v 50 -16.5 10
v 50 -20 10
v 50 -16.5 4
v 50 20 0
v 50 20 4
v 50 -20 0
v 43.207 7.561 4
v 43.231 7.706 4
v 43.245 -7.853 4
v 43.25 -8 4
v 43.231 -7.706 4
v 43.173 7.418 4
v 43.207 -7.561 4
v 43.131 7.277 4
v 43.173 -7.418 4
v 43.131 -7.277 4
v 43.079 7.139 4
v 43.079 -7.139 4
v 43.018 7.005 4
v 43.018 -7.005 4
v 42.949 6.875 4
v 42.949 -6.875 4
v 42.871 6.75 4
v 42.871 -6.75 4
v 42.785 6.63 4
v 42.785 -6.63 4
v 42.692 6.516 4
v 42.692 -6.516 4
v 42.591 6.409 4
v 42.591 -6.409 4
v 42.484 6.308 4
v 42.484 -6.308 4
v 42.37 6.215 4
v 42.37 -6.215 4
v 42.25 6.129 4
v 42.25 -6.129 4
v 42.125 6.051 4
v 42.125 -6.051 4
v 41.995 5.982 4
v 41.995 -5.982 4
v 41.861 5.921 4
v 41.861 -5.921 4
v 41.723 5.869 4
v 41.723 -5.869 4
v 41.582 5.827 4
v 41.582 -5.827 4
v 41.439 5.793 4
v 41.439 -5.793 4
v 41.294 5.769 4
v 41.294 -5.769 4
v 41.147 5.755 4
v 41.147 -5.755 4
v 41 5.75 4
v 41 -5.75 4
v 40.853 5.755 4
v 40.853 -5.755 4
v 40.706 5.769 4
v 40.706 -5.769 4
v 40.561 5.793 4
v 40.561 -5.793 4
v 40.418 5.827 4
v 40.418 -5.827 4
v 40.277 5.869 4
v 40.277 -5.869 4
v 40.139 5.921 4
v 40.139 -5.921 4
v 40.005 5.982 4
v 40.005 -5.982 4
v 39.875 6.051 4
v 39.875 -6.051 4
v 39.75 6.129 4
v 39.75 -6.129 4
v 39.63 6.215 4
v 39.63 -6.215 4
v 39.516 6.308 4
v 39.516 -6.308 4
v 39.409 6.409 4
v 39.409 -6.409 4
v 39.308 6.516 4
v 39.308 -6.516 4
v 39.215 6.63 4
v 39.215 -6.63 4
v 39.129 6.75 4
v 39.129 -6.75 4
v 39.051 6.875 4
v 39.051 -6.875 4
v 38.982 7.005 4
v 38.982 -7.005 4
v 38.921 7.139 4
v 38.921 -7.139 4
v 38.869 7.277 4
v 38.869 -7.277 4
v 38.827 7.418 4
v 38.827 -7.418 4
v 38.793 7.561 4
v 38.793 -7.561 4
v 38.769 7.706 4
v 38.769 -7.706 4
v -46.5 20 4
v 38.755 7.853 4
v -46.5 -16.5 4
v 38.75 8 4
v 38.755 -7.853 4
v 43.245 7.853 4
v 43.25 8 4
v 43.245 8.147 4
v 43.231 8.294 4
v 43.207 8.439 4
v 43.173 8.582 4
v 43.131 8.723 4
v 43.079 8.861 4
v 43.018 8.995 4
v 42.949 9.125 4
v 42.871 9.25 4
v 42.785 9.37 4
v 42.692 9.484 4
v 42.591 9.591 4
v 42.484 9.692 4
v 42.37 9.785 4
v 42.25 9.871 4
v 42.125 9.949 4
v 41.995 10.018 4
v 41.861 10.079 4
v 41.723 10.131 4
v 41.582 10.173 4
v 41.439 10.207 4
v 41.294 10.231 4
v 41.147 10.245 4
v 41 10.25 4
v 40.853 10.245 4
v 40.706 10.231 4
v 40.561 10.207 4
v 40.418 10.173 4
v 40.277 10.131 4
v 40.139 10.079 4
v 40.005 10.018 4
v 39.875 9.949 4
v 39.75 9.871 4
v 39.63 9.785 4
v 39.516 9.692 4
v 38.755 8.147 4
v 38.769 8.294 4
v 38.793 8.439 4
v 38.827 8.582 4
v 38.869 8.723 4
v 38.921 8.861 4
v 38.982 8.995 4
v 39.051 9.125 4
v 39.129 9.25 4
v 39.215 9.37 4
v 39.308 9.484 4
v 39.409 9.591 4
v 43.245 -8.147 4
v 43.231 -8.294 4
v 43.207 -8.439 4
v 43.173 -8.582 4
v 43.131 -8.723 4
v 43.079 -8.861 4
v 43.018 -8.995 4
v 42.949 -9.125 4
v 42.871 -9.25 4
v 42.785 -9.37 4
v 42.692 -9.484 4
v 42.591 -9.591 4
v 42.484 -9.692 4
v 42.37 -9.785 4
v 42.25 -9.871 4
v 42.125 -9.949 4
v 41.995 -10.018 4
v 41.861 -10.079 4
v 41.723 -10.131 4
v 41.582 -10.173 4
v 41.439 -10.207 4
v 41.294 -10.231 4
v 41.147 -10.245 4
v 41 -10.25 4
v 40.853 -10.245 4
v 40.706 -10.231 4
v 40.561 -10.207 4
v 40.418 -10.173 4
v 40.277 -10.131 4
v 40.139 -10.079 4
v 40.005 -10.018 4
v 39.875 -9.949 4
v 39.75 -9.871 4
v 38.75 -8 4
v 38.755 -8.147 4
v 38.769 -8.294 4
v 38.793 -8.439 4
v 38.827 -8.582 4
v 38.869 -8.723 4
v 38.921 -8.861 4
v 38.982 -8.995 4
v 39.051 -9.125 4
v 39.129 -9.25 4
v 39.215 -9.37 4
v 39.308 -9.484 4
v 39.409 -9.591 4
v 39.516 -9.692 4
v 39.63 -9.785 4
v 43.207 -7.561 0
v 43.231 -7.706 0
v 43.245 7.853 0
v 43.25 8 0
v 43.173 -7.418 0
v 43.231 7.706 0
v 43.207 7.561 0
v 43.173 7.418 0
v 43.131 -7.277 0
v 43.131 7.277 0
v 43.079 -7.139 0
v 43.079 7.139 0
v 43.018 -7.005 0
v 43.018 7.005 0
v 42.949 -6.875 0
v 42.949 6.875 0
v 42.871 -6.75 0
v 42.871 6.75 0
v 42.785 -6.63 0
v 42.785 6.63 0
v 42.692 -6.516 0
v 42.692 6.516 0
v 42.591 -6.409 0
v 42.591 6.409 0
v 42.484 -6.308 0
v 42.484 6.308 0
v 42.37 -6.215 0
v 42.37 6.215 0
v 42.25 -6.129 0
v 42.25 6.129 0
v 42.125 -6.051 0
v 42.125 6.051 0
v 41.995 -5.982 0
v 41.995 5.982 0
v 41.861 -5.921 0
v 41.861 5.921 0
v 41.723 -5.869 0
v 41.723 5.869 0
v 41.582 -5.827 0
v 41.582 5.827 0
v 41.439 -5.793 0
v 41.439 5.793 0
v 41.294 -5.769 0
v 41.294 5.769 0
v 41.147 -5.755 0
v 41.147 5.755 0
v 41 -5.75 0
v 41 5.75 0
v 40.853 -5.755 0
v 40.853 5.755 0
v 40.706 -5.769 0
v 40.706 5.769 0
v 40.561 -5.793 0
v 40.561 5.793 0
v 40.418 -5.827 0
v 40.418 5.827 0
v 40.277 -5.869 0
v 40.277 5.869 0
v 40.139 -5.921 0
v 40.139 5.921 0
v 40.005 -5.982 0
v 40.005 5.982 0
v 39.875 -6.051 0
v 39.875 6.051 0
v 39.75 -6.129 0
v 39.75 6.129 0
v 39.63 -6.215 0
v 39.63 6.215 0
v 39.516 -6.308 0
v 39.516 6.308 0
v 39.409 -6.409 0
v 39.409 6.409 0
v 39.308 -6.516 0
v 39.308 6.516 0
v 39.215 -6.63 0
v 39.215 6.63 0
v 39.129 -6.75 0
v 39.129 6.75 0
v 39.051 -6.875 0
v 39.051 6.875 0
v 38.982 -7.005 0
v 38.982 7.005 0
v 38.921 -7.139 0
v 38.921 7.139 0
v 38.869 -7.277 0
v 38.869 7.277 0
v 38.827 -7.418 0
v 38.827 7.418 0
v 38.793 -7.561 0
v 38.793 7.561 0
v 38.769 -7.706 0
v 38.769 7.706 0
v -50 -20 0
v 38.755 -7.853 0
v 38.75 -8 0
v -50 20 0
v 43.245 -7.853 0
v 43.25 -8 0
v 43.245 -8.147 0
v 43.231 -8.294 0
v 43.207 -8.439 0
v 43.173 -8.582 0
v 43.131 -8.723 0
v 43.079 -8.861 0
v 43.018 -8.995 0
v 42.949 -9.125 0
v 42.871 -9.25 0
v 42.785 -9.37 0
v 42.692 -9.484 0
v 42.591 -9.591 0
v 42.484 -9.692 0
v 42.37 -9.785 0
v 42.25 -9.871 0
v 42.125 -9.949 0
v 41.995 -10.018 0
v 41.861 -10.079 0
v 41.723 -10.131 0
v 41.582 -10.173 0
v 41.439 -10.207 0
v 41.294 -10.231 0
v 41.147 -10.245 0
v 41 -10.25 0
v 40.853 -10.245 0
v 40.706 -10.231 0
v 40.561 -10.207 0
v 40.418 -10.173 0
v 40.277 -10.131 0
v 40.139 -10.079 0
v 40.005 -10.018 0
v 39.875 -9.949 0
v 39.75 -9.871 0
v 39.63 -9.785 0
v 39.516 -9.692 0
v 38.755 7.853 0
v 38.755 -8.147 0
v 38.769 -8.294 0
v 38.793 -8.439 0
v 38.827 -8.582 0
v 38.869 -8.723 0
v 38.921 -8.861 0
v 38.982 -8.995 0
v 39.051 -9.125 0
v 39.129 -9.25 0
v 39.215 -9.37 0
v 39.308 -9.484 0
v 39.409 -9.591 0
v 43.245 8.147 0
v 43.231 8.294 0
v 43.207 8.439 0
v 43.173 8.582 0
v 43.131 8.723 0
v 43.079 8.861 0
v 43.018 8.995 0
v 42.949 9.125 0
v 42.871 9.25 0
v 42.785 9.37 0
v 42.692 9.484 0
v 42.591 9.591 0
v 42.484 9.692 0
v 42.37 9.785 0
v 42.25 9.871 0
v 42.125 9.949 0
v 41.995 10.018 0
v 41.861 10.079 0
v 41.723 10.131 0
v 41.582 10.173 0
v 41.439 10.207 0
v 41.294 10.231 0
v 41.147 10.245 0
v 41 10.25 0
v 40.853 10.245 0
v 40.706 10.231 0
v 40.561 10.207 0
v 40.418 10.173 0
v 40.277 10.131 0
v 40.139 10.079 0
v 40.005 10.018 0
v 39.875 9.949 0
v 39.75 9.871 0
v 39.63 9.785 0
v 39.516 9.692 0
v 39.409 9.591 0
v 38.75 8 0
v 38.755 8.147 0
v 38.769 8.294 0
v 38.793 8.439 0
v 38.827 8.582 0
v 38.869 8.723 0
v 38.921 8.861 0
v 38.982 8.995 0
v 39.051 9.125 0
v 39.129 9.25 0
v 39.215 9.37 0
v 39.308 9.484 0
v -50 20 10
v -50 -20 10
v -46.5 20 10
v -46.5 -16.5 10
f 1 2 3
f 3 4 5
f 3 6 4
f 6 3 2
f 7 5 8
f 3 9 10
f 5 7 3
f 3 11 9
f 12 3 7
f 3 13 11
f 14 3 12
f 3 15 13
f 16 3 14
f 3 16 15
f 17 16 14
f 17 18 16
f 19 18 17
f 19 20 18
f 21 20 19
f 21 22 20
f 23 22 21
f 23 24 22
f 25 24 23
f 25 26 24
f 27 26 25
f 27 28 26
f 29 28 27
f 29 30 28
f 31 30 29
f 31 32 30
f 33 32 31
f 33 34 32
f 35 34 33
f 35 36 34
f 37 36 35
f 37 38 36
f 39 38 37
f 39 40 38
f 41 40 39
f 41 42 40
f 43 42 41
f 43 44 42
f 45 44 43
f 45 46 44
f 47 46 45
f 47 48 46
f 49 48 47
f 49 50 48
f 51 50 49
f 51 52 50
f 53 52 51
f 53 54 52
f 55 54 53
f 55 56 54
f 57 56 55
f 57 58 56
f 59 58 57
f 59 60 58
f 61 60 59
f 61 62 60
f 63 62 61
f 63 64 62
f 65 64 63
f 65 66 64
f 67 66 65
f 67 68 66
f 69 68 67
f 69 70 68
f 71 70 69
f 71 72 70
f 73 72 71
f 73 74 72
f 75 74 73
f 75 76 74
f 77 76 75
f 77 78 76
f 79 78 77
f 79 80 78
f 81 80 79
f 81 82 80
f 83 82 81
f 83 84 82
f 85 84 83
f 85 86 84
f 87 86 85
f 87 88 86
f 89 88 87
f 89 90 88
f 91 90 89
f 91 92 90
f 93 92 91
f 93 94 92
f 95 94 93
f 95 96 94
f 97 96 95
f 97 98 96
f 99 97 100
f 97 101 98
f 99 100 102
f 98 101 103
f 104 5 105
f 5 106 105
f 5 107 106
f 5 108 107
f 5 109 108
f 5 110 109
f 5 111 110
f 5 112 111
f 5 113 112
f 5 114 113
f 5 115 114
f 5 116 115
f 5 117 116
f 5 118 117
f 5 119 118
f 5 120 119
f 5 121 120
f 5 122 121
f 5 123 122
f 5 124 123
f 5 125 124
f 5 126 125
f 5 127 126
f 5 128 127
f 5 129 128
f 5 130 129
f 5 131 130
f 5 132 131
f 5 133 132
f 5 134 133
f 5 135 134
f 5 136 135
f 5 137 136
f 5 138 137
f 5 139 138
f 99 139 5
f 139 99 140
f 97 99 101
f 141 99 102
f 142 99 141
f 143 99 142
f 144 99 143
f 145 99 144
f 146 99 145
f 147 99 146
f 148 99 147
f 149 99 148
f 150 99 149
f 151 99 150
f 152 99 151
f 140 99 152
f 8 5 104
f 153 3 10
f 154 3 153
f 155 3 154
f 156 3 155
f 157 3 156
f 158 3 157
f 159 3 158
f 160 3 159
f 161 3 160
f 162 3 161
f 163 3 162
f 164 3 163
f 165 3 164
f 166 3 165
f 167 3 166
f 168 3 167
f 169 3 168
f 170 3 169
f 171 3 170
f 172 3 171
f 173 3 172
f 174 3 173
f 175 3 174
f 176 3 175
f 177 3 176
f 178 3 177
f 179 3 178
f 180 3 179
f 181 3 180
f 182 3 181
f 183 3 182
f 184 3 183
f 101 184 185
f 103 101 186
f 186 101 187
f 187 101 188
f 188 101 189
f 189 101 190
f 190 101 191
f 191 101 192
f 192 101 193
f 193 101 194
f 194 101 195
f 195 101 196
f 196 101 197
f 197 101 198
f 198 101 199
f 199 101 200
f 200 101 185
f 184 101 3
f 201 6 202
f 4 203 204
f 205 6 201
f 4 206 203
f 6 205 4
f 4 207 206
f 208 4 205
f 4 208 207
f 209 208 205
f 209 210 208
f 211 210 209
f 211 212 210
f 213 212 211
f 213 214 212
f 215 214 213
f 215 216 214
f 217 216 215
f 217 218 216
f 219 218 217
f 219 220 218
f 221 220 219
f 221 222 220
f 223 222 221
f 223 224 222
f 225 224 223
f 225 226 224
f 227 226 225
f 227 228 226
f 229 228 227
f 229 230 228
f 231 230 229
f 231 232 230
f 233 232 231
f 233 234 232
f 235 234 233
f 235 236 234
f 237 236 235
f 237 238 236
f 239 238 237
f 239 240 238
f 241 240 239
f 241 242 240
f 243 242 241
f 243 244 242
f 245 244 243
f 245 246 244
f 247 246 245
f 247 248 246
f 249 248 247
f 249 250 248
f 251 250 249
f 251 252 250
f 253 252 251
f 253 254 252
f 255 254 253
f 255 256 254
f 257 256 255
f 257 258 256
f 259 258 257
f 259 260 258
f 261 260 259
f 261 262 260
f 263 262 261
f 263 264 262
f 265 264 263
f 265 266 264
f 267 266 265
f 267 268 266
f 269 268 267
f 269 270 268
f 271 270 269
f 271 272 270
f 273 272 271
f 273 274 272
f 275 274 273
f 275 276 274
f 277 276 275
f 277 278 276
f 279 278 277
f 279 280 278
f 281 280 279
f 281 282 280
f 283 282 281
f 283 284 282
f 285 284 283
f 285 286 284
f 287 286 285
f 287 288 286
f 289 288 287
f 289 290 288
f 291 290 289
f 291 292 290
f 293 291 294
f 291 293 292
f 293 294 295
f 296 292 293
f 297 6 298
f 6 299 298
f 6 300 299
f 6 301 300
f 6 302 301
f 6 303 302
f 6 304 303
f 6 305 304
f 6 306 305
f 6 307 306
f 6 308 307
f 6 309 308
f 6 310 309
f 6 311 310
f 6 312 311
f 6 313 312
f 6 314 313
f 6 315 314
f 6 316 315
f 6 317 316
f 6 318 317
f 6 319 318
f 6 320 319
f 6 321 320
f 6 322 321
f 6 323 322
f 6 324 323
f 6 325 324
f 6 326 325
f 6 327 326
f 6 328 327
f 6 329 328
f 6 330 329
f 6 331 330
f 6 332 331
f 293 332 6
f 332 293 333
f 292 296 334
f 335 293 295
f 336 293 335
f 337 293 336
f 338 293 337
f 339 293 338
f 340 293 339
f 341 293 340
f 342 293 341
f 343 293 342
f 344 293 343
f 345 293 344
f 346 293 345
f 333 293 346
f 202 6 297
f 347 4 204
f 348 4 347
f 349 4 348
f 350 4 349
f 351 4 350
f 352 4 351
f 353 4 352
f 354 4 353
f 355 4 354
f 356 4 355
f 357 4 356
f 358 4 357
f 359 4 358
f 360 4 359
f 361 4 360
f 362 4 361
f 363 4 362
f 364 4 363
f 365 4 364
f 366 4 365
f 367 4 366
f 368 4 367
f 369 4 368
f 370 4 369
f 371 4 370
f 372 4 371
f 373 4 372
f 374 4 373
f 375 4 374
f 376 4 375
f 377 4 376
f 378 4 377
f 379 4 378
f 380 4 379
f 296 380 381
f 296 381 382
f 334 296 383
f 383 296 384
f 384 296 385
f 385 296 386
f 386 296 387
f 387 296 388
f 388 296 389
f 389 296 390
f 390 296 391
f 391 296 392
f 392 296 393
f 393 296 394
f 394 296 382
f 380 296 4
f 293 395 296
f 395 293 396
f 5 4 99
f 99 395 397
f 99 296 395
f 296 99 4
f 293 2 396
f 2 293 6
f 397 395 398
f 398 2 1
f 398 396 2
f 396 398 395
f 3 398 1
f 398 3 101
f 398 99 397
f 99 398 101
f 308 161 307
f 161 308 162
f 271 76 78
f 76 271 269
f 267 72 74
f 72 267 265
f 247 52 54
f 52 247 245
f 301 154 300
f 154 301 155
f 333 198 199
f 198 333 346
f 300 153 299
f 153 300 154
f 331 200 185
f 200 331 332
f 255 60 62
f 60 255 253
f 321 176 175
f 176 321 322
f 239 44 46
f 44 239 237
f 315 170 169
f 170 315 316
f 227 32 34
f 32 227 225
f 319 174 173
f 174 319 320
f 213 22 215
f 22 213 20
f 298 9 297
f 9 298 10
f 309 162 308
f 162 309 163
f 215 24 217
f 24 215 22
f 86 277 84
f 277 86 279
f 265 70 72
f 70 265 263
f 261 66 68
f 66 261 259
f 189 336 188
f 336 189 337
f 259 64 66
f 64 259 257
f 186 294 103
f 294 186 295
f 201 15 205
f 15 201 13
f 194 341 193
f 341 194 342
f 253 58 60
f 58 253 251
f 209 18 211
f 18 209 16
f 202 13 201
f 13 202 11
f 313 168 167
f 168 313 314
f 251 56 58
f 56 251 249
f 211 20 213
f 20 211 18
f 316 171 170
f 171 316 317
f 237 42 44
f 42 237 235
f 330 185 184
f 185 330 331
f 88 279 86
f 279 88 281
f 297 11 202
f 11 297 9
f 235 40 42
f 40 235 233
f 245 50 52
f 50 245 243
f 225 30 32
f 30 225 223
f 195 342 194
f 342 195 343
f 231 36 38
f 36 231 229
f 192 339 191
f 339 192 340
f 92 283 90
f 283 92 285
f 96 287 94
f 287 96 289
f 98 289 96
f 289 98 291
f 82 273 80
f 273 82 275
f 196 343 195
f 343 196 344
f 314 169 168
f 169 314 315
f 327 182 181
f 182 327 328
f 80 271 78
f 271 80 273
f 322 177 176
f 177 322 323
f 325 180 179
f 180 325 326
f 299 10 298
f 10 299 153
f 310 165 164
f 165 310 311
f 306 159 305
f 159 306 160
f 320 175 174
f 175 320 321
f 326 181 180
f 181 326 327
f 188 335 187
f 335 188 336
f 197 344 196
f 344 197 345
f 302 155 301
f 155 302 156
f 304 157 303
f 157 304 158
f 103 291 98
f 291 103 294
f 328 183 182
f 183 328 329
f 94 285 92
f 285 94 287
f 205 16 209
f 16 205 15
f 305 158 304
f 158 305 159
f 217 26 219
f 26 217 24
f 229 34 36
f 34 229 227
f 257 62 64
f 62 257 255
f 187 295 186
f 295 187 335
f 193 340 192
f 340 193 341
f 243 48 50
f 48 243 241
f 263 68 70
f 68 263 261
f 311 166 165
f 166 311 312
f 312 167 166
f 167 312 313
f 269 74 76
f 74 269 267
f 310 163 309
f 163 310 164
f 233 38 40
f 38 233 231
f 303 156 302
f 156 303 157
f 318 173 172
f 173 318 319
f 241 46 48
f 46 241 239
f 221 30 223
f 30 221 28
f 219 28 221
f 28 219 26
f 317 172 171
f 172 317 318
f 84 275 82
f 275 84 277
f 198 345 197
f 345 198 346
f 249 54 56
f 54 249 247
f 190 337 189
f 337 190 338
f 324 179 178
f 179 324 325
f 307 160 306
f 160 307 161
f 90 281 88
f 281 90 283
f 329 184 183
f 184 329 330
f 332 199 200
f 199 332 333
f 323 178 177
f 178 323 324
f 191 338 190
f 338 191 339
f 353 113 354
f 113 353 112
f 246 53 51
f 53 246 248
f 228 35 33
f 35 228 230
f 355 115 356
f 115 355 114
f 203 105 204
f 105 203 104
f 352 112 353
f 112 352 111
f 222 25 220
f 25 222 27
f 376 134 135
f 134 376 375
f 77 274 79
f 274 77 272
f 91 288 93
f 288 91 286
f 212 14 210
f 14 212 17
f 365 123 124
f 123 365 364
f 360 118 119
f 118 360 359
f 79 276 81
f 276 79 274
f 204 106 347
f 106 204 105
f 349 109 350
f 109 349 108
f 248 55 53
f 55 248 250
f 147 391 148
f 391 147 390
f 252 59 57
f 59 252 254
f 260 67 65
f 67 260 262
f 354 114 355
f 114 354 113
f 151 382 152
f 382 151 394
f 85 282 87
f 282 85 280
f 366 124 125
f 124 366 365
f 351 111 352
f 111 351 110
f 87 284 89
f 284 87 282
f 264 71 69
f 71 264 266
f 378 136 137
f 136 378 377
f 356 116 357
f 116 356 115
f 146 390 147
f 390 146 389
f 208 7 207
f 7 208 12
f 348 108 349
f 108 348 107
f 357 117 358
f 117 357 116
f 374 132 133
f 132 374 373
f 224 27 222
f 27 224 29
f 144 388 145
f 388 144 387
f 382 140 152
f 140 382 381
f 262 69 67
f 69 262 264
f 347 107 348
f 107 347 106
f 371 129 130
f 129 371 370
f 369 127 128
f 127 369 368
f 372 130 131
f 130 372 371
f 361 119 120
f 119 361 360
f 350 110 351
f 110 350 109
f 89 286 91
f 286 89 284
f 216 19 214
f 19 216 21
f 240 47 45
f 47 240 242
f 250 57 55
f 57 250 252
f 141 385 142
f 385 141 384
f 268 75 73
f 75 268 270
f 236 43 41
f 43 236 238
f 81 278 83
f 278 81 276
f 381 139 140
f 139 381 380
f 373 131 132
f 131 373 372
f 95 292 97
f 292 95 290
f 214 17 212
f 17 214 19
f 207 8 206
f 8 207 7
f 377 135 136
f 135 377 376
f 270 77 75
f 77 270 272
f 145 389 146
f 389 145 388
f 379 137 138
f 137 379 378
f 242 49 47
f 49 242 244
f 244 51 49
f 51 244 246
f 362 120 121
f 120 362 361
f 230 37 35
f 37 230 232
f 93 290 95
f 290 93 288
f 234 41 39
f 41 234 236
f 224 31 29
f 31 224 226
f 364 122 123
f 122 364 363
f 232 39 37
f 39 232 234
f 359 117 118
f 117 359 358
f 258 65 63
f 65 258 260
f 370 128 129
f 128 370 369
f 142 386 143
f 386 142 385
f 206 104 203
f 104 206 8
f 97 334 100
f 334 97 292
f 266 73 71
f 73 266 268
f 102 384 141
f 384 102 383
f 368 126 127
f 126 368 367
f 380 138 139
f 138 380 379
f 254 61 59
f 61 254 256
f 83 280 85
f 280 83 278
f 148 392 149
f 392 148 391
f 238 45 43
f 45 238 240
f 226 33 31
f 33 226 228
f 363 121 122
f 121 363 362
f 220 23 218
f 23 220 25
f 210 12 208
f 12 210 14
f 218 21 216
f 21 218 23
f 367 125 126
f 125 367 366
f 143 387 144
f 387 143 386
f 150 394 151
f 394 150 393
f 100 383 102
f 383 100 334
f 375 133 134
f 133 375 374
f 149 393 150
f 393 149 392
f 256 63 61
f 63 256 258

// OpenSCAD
// Microscope-slide registration jig with two clamp holes
// Category: benchware; Purpose: repeatable origin when photographing a 75 x 25 mm microscope slide.
// Print: FDM, on the broad bottom face at z=0; no support required.
// This is a geometric reference design; no dimensional fit or lab use has been physically validated.
// SPDX-License-Identifier: CERN-OHL-P-2.0

/* [Platform] */
// Overall platform length, X (mm)
base_l = 100; // 0.5
// Overall platform width, Y (mm)
base_w = 40; // 0.5
// Platform thickness (mm)
base_h = 4; // 0.5

/* [Registration Edges] */
// Width of each perpendicular registration rail (mm)
rail_w = 3.5; // 0.1
// Height of rails above print bed (mm)
rail_top = 10; // 0.5

/* [Fasteners] */
// Diameter of each right-side mounting hole (mm)
bore_d = 4.5; // 0.1
// X coordinate of the mounting-hole centers (mm)
bore_x = 41; // 0.5
// Absolute Y coordinate of mounting-hole centers (mm)
bore_y = 8; // 0.5

/* [Hidden] */
$fn = 96;
eps = 0.1;
assert(base_l >= 90 && base_w >= 35);
assert(rail_w >= 1.6 && rail_top >= base_h + 2);
assert(bore_d > 0 && bore_d < 8);
assert(bore_x + bore_d/2 < base_l/2 - 1);
assert(bore_x - bore_d/2 > -base_l/2 + rail_w + 1);
assert(bore_y + bore_d/2 < base_w/2 - 1);
assert(bore_y - bore_d/2 > -base_w/2 + rail_w + 1);
assert(bore_d / 2 + 2 < bore_y);

difference() {
    union() {
        translate([-base_l/2, -base_w/2, 0])
            cube([base_l, base_w, base_h]);
        translate([-base_l/2, -base_w/2, base_h])
            cube([base_l, rail_w, rail_top-base_h]);
        translate([-base_l/2, -base_w/2, base_h])
            cube([rail_w, base_w, rail_top-base_h]);
    }
    for (sign=[-1,1])
        translate([bore_x, sign*bore_y, -eps])
            cylinder(h=base_h+2*eps, d=bore_d);
}
